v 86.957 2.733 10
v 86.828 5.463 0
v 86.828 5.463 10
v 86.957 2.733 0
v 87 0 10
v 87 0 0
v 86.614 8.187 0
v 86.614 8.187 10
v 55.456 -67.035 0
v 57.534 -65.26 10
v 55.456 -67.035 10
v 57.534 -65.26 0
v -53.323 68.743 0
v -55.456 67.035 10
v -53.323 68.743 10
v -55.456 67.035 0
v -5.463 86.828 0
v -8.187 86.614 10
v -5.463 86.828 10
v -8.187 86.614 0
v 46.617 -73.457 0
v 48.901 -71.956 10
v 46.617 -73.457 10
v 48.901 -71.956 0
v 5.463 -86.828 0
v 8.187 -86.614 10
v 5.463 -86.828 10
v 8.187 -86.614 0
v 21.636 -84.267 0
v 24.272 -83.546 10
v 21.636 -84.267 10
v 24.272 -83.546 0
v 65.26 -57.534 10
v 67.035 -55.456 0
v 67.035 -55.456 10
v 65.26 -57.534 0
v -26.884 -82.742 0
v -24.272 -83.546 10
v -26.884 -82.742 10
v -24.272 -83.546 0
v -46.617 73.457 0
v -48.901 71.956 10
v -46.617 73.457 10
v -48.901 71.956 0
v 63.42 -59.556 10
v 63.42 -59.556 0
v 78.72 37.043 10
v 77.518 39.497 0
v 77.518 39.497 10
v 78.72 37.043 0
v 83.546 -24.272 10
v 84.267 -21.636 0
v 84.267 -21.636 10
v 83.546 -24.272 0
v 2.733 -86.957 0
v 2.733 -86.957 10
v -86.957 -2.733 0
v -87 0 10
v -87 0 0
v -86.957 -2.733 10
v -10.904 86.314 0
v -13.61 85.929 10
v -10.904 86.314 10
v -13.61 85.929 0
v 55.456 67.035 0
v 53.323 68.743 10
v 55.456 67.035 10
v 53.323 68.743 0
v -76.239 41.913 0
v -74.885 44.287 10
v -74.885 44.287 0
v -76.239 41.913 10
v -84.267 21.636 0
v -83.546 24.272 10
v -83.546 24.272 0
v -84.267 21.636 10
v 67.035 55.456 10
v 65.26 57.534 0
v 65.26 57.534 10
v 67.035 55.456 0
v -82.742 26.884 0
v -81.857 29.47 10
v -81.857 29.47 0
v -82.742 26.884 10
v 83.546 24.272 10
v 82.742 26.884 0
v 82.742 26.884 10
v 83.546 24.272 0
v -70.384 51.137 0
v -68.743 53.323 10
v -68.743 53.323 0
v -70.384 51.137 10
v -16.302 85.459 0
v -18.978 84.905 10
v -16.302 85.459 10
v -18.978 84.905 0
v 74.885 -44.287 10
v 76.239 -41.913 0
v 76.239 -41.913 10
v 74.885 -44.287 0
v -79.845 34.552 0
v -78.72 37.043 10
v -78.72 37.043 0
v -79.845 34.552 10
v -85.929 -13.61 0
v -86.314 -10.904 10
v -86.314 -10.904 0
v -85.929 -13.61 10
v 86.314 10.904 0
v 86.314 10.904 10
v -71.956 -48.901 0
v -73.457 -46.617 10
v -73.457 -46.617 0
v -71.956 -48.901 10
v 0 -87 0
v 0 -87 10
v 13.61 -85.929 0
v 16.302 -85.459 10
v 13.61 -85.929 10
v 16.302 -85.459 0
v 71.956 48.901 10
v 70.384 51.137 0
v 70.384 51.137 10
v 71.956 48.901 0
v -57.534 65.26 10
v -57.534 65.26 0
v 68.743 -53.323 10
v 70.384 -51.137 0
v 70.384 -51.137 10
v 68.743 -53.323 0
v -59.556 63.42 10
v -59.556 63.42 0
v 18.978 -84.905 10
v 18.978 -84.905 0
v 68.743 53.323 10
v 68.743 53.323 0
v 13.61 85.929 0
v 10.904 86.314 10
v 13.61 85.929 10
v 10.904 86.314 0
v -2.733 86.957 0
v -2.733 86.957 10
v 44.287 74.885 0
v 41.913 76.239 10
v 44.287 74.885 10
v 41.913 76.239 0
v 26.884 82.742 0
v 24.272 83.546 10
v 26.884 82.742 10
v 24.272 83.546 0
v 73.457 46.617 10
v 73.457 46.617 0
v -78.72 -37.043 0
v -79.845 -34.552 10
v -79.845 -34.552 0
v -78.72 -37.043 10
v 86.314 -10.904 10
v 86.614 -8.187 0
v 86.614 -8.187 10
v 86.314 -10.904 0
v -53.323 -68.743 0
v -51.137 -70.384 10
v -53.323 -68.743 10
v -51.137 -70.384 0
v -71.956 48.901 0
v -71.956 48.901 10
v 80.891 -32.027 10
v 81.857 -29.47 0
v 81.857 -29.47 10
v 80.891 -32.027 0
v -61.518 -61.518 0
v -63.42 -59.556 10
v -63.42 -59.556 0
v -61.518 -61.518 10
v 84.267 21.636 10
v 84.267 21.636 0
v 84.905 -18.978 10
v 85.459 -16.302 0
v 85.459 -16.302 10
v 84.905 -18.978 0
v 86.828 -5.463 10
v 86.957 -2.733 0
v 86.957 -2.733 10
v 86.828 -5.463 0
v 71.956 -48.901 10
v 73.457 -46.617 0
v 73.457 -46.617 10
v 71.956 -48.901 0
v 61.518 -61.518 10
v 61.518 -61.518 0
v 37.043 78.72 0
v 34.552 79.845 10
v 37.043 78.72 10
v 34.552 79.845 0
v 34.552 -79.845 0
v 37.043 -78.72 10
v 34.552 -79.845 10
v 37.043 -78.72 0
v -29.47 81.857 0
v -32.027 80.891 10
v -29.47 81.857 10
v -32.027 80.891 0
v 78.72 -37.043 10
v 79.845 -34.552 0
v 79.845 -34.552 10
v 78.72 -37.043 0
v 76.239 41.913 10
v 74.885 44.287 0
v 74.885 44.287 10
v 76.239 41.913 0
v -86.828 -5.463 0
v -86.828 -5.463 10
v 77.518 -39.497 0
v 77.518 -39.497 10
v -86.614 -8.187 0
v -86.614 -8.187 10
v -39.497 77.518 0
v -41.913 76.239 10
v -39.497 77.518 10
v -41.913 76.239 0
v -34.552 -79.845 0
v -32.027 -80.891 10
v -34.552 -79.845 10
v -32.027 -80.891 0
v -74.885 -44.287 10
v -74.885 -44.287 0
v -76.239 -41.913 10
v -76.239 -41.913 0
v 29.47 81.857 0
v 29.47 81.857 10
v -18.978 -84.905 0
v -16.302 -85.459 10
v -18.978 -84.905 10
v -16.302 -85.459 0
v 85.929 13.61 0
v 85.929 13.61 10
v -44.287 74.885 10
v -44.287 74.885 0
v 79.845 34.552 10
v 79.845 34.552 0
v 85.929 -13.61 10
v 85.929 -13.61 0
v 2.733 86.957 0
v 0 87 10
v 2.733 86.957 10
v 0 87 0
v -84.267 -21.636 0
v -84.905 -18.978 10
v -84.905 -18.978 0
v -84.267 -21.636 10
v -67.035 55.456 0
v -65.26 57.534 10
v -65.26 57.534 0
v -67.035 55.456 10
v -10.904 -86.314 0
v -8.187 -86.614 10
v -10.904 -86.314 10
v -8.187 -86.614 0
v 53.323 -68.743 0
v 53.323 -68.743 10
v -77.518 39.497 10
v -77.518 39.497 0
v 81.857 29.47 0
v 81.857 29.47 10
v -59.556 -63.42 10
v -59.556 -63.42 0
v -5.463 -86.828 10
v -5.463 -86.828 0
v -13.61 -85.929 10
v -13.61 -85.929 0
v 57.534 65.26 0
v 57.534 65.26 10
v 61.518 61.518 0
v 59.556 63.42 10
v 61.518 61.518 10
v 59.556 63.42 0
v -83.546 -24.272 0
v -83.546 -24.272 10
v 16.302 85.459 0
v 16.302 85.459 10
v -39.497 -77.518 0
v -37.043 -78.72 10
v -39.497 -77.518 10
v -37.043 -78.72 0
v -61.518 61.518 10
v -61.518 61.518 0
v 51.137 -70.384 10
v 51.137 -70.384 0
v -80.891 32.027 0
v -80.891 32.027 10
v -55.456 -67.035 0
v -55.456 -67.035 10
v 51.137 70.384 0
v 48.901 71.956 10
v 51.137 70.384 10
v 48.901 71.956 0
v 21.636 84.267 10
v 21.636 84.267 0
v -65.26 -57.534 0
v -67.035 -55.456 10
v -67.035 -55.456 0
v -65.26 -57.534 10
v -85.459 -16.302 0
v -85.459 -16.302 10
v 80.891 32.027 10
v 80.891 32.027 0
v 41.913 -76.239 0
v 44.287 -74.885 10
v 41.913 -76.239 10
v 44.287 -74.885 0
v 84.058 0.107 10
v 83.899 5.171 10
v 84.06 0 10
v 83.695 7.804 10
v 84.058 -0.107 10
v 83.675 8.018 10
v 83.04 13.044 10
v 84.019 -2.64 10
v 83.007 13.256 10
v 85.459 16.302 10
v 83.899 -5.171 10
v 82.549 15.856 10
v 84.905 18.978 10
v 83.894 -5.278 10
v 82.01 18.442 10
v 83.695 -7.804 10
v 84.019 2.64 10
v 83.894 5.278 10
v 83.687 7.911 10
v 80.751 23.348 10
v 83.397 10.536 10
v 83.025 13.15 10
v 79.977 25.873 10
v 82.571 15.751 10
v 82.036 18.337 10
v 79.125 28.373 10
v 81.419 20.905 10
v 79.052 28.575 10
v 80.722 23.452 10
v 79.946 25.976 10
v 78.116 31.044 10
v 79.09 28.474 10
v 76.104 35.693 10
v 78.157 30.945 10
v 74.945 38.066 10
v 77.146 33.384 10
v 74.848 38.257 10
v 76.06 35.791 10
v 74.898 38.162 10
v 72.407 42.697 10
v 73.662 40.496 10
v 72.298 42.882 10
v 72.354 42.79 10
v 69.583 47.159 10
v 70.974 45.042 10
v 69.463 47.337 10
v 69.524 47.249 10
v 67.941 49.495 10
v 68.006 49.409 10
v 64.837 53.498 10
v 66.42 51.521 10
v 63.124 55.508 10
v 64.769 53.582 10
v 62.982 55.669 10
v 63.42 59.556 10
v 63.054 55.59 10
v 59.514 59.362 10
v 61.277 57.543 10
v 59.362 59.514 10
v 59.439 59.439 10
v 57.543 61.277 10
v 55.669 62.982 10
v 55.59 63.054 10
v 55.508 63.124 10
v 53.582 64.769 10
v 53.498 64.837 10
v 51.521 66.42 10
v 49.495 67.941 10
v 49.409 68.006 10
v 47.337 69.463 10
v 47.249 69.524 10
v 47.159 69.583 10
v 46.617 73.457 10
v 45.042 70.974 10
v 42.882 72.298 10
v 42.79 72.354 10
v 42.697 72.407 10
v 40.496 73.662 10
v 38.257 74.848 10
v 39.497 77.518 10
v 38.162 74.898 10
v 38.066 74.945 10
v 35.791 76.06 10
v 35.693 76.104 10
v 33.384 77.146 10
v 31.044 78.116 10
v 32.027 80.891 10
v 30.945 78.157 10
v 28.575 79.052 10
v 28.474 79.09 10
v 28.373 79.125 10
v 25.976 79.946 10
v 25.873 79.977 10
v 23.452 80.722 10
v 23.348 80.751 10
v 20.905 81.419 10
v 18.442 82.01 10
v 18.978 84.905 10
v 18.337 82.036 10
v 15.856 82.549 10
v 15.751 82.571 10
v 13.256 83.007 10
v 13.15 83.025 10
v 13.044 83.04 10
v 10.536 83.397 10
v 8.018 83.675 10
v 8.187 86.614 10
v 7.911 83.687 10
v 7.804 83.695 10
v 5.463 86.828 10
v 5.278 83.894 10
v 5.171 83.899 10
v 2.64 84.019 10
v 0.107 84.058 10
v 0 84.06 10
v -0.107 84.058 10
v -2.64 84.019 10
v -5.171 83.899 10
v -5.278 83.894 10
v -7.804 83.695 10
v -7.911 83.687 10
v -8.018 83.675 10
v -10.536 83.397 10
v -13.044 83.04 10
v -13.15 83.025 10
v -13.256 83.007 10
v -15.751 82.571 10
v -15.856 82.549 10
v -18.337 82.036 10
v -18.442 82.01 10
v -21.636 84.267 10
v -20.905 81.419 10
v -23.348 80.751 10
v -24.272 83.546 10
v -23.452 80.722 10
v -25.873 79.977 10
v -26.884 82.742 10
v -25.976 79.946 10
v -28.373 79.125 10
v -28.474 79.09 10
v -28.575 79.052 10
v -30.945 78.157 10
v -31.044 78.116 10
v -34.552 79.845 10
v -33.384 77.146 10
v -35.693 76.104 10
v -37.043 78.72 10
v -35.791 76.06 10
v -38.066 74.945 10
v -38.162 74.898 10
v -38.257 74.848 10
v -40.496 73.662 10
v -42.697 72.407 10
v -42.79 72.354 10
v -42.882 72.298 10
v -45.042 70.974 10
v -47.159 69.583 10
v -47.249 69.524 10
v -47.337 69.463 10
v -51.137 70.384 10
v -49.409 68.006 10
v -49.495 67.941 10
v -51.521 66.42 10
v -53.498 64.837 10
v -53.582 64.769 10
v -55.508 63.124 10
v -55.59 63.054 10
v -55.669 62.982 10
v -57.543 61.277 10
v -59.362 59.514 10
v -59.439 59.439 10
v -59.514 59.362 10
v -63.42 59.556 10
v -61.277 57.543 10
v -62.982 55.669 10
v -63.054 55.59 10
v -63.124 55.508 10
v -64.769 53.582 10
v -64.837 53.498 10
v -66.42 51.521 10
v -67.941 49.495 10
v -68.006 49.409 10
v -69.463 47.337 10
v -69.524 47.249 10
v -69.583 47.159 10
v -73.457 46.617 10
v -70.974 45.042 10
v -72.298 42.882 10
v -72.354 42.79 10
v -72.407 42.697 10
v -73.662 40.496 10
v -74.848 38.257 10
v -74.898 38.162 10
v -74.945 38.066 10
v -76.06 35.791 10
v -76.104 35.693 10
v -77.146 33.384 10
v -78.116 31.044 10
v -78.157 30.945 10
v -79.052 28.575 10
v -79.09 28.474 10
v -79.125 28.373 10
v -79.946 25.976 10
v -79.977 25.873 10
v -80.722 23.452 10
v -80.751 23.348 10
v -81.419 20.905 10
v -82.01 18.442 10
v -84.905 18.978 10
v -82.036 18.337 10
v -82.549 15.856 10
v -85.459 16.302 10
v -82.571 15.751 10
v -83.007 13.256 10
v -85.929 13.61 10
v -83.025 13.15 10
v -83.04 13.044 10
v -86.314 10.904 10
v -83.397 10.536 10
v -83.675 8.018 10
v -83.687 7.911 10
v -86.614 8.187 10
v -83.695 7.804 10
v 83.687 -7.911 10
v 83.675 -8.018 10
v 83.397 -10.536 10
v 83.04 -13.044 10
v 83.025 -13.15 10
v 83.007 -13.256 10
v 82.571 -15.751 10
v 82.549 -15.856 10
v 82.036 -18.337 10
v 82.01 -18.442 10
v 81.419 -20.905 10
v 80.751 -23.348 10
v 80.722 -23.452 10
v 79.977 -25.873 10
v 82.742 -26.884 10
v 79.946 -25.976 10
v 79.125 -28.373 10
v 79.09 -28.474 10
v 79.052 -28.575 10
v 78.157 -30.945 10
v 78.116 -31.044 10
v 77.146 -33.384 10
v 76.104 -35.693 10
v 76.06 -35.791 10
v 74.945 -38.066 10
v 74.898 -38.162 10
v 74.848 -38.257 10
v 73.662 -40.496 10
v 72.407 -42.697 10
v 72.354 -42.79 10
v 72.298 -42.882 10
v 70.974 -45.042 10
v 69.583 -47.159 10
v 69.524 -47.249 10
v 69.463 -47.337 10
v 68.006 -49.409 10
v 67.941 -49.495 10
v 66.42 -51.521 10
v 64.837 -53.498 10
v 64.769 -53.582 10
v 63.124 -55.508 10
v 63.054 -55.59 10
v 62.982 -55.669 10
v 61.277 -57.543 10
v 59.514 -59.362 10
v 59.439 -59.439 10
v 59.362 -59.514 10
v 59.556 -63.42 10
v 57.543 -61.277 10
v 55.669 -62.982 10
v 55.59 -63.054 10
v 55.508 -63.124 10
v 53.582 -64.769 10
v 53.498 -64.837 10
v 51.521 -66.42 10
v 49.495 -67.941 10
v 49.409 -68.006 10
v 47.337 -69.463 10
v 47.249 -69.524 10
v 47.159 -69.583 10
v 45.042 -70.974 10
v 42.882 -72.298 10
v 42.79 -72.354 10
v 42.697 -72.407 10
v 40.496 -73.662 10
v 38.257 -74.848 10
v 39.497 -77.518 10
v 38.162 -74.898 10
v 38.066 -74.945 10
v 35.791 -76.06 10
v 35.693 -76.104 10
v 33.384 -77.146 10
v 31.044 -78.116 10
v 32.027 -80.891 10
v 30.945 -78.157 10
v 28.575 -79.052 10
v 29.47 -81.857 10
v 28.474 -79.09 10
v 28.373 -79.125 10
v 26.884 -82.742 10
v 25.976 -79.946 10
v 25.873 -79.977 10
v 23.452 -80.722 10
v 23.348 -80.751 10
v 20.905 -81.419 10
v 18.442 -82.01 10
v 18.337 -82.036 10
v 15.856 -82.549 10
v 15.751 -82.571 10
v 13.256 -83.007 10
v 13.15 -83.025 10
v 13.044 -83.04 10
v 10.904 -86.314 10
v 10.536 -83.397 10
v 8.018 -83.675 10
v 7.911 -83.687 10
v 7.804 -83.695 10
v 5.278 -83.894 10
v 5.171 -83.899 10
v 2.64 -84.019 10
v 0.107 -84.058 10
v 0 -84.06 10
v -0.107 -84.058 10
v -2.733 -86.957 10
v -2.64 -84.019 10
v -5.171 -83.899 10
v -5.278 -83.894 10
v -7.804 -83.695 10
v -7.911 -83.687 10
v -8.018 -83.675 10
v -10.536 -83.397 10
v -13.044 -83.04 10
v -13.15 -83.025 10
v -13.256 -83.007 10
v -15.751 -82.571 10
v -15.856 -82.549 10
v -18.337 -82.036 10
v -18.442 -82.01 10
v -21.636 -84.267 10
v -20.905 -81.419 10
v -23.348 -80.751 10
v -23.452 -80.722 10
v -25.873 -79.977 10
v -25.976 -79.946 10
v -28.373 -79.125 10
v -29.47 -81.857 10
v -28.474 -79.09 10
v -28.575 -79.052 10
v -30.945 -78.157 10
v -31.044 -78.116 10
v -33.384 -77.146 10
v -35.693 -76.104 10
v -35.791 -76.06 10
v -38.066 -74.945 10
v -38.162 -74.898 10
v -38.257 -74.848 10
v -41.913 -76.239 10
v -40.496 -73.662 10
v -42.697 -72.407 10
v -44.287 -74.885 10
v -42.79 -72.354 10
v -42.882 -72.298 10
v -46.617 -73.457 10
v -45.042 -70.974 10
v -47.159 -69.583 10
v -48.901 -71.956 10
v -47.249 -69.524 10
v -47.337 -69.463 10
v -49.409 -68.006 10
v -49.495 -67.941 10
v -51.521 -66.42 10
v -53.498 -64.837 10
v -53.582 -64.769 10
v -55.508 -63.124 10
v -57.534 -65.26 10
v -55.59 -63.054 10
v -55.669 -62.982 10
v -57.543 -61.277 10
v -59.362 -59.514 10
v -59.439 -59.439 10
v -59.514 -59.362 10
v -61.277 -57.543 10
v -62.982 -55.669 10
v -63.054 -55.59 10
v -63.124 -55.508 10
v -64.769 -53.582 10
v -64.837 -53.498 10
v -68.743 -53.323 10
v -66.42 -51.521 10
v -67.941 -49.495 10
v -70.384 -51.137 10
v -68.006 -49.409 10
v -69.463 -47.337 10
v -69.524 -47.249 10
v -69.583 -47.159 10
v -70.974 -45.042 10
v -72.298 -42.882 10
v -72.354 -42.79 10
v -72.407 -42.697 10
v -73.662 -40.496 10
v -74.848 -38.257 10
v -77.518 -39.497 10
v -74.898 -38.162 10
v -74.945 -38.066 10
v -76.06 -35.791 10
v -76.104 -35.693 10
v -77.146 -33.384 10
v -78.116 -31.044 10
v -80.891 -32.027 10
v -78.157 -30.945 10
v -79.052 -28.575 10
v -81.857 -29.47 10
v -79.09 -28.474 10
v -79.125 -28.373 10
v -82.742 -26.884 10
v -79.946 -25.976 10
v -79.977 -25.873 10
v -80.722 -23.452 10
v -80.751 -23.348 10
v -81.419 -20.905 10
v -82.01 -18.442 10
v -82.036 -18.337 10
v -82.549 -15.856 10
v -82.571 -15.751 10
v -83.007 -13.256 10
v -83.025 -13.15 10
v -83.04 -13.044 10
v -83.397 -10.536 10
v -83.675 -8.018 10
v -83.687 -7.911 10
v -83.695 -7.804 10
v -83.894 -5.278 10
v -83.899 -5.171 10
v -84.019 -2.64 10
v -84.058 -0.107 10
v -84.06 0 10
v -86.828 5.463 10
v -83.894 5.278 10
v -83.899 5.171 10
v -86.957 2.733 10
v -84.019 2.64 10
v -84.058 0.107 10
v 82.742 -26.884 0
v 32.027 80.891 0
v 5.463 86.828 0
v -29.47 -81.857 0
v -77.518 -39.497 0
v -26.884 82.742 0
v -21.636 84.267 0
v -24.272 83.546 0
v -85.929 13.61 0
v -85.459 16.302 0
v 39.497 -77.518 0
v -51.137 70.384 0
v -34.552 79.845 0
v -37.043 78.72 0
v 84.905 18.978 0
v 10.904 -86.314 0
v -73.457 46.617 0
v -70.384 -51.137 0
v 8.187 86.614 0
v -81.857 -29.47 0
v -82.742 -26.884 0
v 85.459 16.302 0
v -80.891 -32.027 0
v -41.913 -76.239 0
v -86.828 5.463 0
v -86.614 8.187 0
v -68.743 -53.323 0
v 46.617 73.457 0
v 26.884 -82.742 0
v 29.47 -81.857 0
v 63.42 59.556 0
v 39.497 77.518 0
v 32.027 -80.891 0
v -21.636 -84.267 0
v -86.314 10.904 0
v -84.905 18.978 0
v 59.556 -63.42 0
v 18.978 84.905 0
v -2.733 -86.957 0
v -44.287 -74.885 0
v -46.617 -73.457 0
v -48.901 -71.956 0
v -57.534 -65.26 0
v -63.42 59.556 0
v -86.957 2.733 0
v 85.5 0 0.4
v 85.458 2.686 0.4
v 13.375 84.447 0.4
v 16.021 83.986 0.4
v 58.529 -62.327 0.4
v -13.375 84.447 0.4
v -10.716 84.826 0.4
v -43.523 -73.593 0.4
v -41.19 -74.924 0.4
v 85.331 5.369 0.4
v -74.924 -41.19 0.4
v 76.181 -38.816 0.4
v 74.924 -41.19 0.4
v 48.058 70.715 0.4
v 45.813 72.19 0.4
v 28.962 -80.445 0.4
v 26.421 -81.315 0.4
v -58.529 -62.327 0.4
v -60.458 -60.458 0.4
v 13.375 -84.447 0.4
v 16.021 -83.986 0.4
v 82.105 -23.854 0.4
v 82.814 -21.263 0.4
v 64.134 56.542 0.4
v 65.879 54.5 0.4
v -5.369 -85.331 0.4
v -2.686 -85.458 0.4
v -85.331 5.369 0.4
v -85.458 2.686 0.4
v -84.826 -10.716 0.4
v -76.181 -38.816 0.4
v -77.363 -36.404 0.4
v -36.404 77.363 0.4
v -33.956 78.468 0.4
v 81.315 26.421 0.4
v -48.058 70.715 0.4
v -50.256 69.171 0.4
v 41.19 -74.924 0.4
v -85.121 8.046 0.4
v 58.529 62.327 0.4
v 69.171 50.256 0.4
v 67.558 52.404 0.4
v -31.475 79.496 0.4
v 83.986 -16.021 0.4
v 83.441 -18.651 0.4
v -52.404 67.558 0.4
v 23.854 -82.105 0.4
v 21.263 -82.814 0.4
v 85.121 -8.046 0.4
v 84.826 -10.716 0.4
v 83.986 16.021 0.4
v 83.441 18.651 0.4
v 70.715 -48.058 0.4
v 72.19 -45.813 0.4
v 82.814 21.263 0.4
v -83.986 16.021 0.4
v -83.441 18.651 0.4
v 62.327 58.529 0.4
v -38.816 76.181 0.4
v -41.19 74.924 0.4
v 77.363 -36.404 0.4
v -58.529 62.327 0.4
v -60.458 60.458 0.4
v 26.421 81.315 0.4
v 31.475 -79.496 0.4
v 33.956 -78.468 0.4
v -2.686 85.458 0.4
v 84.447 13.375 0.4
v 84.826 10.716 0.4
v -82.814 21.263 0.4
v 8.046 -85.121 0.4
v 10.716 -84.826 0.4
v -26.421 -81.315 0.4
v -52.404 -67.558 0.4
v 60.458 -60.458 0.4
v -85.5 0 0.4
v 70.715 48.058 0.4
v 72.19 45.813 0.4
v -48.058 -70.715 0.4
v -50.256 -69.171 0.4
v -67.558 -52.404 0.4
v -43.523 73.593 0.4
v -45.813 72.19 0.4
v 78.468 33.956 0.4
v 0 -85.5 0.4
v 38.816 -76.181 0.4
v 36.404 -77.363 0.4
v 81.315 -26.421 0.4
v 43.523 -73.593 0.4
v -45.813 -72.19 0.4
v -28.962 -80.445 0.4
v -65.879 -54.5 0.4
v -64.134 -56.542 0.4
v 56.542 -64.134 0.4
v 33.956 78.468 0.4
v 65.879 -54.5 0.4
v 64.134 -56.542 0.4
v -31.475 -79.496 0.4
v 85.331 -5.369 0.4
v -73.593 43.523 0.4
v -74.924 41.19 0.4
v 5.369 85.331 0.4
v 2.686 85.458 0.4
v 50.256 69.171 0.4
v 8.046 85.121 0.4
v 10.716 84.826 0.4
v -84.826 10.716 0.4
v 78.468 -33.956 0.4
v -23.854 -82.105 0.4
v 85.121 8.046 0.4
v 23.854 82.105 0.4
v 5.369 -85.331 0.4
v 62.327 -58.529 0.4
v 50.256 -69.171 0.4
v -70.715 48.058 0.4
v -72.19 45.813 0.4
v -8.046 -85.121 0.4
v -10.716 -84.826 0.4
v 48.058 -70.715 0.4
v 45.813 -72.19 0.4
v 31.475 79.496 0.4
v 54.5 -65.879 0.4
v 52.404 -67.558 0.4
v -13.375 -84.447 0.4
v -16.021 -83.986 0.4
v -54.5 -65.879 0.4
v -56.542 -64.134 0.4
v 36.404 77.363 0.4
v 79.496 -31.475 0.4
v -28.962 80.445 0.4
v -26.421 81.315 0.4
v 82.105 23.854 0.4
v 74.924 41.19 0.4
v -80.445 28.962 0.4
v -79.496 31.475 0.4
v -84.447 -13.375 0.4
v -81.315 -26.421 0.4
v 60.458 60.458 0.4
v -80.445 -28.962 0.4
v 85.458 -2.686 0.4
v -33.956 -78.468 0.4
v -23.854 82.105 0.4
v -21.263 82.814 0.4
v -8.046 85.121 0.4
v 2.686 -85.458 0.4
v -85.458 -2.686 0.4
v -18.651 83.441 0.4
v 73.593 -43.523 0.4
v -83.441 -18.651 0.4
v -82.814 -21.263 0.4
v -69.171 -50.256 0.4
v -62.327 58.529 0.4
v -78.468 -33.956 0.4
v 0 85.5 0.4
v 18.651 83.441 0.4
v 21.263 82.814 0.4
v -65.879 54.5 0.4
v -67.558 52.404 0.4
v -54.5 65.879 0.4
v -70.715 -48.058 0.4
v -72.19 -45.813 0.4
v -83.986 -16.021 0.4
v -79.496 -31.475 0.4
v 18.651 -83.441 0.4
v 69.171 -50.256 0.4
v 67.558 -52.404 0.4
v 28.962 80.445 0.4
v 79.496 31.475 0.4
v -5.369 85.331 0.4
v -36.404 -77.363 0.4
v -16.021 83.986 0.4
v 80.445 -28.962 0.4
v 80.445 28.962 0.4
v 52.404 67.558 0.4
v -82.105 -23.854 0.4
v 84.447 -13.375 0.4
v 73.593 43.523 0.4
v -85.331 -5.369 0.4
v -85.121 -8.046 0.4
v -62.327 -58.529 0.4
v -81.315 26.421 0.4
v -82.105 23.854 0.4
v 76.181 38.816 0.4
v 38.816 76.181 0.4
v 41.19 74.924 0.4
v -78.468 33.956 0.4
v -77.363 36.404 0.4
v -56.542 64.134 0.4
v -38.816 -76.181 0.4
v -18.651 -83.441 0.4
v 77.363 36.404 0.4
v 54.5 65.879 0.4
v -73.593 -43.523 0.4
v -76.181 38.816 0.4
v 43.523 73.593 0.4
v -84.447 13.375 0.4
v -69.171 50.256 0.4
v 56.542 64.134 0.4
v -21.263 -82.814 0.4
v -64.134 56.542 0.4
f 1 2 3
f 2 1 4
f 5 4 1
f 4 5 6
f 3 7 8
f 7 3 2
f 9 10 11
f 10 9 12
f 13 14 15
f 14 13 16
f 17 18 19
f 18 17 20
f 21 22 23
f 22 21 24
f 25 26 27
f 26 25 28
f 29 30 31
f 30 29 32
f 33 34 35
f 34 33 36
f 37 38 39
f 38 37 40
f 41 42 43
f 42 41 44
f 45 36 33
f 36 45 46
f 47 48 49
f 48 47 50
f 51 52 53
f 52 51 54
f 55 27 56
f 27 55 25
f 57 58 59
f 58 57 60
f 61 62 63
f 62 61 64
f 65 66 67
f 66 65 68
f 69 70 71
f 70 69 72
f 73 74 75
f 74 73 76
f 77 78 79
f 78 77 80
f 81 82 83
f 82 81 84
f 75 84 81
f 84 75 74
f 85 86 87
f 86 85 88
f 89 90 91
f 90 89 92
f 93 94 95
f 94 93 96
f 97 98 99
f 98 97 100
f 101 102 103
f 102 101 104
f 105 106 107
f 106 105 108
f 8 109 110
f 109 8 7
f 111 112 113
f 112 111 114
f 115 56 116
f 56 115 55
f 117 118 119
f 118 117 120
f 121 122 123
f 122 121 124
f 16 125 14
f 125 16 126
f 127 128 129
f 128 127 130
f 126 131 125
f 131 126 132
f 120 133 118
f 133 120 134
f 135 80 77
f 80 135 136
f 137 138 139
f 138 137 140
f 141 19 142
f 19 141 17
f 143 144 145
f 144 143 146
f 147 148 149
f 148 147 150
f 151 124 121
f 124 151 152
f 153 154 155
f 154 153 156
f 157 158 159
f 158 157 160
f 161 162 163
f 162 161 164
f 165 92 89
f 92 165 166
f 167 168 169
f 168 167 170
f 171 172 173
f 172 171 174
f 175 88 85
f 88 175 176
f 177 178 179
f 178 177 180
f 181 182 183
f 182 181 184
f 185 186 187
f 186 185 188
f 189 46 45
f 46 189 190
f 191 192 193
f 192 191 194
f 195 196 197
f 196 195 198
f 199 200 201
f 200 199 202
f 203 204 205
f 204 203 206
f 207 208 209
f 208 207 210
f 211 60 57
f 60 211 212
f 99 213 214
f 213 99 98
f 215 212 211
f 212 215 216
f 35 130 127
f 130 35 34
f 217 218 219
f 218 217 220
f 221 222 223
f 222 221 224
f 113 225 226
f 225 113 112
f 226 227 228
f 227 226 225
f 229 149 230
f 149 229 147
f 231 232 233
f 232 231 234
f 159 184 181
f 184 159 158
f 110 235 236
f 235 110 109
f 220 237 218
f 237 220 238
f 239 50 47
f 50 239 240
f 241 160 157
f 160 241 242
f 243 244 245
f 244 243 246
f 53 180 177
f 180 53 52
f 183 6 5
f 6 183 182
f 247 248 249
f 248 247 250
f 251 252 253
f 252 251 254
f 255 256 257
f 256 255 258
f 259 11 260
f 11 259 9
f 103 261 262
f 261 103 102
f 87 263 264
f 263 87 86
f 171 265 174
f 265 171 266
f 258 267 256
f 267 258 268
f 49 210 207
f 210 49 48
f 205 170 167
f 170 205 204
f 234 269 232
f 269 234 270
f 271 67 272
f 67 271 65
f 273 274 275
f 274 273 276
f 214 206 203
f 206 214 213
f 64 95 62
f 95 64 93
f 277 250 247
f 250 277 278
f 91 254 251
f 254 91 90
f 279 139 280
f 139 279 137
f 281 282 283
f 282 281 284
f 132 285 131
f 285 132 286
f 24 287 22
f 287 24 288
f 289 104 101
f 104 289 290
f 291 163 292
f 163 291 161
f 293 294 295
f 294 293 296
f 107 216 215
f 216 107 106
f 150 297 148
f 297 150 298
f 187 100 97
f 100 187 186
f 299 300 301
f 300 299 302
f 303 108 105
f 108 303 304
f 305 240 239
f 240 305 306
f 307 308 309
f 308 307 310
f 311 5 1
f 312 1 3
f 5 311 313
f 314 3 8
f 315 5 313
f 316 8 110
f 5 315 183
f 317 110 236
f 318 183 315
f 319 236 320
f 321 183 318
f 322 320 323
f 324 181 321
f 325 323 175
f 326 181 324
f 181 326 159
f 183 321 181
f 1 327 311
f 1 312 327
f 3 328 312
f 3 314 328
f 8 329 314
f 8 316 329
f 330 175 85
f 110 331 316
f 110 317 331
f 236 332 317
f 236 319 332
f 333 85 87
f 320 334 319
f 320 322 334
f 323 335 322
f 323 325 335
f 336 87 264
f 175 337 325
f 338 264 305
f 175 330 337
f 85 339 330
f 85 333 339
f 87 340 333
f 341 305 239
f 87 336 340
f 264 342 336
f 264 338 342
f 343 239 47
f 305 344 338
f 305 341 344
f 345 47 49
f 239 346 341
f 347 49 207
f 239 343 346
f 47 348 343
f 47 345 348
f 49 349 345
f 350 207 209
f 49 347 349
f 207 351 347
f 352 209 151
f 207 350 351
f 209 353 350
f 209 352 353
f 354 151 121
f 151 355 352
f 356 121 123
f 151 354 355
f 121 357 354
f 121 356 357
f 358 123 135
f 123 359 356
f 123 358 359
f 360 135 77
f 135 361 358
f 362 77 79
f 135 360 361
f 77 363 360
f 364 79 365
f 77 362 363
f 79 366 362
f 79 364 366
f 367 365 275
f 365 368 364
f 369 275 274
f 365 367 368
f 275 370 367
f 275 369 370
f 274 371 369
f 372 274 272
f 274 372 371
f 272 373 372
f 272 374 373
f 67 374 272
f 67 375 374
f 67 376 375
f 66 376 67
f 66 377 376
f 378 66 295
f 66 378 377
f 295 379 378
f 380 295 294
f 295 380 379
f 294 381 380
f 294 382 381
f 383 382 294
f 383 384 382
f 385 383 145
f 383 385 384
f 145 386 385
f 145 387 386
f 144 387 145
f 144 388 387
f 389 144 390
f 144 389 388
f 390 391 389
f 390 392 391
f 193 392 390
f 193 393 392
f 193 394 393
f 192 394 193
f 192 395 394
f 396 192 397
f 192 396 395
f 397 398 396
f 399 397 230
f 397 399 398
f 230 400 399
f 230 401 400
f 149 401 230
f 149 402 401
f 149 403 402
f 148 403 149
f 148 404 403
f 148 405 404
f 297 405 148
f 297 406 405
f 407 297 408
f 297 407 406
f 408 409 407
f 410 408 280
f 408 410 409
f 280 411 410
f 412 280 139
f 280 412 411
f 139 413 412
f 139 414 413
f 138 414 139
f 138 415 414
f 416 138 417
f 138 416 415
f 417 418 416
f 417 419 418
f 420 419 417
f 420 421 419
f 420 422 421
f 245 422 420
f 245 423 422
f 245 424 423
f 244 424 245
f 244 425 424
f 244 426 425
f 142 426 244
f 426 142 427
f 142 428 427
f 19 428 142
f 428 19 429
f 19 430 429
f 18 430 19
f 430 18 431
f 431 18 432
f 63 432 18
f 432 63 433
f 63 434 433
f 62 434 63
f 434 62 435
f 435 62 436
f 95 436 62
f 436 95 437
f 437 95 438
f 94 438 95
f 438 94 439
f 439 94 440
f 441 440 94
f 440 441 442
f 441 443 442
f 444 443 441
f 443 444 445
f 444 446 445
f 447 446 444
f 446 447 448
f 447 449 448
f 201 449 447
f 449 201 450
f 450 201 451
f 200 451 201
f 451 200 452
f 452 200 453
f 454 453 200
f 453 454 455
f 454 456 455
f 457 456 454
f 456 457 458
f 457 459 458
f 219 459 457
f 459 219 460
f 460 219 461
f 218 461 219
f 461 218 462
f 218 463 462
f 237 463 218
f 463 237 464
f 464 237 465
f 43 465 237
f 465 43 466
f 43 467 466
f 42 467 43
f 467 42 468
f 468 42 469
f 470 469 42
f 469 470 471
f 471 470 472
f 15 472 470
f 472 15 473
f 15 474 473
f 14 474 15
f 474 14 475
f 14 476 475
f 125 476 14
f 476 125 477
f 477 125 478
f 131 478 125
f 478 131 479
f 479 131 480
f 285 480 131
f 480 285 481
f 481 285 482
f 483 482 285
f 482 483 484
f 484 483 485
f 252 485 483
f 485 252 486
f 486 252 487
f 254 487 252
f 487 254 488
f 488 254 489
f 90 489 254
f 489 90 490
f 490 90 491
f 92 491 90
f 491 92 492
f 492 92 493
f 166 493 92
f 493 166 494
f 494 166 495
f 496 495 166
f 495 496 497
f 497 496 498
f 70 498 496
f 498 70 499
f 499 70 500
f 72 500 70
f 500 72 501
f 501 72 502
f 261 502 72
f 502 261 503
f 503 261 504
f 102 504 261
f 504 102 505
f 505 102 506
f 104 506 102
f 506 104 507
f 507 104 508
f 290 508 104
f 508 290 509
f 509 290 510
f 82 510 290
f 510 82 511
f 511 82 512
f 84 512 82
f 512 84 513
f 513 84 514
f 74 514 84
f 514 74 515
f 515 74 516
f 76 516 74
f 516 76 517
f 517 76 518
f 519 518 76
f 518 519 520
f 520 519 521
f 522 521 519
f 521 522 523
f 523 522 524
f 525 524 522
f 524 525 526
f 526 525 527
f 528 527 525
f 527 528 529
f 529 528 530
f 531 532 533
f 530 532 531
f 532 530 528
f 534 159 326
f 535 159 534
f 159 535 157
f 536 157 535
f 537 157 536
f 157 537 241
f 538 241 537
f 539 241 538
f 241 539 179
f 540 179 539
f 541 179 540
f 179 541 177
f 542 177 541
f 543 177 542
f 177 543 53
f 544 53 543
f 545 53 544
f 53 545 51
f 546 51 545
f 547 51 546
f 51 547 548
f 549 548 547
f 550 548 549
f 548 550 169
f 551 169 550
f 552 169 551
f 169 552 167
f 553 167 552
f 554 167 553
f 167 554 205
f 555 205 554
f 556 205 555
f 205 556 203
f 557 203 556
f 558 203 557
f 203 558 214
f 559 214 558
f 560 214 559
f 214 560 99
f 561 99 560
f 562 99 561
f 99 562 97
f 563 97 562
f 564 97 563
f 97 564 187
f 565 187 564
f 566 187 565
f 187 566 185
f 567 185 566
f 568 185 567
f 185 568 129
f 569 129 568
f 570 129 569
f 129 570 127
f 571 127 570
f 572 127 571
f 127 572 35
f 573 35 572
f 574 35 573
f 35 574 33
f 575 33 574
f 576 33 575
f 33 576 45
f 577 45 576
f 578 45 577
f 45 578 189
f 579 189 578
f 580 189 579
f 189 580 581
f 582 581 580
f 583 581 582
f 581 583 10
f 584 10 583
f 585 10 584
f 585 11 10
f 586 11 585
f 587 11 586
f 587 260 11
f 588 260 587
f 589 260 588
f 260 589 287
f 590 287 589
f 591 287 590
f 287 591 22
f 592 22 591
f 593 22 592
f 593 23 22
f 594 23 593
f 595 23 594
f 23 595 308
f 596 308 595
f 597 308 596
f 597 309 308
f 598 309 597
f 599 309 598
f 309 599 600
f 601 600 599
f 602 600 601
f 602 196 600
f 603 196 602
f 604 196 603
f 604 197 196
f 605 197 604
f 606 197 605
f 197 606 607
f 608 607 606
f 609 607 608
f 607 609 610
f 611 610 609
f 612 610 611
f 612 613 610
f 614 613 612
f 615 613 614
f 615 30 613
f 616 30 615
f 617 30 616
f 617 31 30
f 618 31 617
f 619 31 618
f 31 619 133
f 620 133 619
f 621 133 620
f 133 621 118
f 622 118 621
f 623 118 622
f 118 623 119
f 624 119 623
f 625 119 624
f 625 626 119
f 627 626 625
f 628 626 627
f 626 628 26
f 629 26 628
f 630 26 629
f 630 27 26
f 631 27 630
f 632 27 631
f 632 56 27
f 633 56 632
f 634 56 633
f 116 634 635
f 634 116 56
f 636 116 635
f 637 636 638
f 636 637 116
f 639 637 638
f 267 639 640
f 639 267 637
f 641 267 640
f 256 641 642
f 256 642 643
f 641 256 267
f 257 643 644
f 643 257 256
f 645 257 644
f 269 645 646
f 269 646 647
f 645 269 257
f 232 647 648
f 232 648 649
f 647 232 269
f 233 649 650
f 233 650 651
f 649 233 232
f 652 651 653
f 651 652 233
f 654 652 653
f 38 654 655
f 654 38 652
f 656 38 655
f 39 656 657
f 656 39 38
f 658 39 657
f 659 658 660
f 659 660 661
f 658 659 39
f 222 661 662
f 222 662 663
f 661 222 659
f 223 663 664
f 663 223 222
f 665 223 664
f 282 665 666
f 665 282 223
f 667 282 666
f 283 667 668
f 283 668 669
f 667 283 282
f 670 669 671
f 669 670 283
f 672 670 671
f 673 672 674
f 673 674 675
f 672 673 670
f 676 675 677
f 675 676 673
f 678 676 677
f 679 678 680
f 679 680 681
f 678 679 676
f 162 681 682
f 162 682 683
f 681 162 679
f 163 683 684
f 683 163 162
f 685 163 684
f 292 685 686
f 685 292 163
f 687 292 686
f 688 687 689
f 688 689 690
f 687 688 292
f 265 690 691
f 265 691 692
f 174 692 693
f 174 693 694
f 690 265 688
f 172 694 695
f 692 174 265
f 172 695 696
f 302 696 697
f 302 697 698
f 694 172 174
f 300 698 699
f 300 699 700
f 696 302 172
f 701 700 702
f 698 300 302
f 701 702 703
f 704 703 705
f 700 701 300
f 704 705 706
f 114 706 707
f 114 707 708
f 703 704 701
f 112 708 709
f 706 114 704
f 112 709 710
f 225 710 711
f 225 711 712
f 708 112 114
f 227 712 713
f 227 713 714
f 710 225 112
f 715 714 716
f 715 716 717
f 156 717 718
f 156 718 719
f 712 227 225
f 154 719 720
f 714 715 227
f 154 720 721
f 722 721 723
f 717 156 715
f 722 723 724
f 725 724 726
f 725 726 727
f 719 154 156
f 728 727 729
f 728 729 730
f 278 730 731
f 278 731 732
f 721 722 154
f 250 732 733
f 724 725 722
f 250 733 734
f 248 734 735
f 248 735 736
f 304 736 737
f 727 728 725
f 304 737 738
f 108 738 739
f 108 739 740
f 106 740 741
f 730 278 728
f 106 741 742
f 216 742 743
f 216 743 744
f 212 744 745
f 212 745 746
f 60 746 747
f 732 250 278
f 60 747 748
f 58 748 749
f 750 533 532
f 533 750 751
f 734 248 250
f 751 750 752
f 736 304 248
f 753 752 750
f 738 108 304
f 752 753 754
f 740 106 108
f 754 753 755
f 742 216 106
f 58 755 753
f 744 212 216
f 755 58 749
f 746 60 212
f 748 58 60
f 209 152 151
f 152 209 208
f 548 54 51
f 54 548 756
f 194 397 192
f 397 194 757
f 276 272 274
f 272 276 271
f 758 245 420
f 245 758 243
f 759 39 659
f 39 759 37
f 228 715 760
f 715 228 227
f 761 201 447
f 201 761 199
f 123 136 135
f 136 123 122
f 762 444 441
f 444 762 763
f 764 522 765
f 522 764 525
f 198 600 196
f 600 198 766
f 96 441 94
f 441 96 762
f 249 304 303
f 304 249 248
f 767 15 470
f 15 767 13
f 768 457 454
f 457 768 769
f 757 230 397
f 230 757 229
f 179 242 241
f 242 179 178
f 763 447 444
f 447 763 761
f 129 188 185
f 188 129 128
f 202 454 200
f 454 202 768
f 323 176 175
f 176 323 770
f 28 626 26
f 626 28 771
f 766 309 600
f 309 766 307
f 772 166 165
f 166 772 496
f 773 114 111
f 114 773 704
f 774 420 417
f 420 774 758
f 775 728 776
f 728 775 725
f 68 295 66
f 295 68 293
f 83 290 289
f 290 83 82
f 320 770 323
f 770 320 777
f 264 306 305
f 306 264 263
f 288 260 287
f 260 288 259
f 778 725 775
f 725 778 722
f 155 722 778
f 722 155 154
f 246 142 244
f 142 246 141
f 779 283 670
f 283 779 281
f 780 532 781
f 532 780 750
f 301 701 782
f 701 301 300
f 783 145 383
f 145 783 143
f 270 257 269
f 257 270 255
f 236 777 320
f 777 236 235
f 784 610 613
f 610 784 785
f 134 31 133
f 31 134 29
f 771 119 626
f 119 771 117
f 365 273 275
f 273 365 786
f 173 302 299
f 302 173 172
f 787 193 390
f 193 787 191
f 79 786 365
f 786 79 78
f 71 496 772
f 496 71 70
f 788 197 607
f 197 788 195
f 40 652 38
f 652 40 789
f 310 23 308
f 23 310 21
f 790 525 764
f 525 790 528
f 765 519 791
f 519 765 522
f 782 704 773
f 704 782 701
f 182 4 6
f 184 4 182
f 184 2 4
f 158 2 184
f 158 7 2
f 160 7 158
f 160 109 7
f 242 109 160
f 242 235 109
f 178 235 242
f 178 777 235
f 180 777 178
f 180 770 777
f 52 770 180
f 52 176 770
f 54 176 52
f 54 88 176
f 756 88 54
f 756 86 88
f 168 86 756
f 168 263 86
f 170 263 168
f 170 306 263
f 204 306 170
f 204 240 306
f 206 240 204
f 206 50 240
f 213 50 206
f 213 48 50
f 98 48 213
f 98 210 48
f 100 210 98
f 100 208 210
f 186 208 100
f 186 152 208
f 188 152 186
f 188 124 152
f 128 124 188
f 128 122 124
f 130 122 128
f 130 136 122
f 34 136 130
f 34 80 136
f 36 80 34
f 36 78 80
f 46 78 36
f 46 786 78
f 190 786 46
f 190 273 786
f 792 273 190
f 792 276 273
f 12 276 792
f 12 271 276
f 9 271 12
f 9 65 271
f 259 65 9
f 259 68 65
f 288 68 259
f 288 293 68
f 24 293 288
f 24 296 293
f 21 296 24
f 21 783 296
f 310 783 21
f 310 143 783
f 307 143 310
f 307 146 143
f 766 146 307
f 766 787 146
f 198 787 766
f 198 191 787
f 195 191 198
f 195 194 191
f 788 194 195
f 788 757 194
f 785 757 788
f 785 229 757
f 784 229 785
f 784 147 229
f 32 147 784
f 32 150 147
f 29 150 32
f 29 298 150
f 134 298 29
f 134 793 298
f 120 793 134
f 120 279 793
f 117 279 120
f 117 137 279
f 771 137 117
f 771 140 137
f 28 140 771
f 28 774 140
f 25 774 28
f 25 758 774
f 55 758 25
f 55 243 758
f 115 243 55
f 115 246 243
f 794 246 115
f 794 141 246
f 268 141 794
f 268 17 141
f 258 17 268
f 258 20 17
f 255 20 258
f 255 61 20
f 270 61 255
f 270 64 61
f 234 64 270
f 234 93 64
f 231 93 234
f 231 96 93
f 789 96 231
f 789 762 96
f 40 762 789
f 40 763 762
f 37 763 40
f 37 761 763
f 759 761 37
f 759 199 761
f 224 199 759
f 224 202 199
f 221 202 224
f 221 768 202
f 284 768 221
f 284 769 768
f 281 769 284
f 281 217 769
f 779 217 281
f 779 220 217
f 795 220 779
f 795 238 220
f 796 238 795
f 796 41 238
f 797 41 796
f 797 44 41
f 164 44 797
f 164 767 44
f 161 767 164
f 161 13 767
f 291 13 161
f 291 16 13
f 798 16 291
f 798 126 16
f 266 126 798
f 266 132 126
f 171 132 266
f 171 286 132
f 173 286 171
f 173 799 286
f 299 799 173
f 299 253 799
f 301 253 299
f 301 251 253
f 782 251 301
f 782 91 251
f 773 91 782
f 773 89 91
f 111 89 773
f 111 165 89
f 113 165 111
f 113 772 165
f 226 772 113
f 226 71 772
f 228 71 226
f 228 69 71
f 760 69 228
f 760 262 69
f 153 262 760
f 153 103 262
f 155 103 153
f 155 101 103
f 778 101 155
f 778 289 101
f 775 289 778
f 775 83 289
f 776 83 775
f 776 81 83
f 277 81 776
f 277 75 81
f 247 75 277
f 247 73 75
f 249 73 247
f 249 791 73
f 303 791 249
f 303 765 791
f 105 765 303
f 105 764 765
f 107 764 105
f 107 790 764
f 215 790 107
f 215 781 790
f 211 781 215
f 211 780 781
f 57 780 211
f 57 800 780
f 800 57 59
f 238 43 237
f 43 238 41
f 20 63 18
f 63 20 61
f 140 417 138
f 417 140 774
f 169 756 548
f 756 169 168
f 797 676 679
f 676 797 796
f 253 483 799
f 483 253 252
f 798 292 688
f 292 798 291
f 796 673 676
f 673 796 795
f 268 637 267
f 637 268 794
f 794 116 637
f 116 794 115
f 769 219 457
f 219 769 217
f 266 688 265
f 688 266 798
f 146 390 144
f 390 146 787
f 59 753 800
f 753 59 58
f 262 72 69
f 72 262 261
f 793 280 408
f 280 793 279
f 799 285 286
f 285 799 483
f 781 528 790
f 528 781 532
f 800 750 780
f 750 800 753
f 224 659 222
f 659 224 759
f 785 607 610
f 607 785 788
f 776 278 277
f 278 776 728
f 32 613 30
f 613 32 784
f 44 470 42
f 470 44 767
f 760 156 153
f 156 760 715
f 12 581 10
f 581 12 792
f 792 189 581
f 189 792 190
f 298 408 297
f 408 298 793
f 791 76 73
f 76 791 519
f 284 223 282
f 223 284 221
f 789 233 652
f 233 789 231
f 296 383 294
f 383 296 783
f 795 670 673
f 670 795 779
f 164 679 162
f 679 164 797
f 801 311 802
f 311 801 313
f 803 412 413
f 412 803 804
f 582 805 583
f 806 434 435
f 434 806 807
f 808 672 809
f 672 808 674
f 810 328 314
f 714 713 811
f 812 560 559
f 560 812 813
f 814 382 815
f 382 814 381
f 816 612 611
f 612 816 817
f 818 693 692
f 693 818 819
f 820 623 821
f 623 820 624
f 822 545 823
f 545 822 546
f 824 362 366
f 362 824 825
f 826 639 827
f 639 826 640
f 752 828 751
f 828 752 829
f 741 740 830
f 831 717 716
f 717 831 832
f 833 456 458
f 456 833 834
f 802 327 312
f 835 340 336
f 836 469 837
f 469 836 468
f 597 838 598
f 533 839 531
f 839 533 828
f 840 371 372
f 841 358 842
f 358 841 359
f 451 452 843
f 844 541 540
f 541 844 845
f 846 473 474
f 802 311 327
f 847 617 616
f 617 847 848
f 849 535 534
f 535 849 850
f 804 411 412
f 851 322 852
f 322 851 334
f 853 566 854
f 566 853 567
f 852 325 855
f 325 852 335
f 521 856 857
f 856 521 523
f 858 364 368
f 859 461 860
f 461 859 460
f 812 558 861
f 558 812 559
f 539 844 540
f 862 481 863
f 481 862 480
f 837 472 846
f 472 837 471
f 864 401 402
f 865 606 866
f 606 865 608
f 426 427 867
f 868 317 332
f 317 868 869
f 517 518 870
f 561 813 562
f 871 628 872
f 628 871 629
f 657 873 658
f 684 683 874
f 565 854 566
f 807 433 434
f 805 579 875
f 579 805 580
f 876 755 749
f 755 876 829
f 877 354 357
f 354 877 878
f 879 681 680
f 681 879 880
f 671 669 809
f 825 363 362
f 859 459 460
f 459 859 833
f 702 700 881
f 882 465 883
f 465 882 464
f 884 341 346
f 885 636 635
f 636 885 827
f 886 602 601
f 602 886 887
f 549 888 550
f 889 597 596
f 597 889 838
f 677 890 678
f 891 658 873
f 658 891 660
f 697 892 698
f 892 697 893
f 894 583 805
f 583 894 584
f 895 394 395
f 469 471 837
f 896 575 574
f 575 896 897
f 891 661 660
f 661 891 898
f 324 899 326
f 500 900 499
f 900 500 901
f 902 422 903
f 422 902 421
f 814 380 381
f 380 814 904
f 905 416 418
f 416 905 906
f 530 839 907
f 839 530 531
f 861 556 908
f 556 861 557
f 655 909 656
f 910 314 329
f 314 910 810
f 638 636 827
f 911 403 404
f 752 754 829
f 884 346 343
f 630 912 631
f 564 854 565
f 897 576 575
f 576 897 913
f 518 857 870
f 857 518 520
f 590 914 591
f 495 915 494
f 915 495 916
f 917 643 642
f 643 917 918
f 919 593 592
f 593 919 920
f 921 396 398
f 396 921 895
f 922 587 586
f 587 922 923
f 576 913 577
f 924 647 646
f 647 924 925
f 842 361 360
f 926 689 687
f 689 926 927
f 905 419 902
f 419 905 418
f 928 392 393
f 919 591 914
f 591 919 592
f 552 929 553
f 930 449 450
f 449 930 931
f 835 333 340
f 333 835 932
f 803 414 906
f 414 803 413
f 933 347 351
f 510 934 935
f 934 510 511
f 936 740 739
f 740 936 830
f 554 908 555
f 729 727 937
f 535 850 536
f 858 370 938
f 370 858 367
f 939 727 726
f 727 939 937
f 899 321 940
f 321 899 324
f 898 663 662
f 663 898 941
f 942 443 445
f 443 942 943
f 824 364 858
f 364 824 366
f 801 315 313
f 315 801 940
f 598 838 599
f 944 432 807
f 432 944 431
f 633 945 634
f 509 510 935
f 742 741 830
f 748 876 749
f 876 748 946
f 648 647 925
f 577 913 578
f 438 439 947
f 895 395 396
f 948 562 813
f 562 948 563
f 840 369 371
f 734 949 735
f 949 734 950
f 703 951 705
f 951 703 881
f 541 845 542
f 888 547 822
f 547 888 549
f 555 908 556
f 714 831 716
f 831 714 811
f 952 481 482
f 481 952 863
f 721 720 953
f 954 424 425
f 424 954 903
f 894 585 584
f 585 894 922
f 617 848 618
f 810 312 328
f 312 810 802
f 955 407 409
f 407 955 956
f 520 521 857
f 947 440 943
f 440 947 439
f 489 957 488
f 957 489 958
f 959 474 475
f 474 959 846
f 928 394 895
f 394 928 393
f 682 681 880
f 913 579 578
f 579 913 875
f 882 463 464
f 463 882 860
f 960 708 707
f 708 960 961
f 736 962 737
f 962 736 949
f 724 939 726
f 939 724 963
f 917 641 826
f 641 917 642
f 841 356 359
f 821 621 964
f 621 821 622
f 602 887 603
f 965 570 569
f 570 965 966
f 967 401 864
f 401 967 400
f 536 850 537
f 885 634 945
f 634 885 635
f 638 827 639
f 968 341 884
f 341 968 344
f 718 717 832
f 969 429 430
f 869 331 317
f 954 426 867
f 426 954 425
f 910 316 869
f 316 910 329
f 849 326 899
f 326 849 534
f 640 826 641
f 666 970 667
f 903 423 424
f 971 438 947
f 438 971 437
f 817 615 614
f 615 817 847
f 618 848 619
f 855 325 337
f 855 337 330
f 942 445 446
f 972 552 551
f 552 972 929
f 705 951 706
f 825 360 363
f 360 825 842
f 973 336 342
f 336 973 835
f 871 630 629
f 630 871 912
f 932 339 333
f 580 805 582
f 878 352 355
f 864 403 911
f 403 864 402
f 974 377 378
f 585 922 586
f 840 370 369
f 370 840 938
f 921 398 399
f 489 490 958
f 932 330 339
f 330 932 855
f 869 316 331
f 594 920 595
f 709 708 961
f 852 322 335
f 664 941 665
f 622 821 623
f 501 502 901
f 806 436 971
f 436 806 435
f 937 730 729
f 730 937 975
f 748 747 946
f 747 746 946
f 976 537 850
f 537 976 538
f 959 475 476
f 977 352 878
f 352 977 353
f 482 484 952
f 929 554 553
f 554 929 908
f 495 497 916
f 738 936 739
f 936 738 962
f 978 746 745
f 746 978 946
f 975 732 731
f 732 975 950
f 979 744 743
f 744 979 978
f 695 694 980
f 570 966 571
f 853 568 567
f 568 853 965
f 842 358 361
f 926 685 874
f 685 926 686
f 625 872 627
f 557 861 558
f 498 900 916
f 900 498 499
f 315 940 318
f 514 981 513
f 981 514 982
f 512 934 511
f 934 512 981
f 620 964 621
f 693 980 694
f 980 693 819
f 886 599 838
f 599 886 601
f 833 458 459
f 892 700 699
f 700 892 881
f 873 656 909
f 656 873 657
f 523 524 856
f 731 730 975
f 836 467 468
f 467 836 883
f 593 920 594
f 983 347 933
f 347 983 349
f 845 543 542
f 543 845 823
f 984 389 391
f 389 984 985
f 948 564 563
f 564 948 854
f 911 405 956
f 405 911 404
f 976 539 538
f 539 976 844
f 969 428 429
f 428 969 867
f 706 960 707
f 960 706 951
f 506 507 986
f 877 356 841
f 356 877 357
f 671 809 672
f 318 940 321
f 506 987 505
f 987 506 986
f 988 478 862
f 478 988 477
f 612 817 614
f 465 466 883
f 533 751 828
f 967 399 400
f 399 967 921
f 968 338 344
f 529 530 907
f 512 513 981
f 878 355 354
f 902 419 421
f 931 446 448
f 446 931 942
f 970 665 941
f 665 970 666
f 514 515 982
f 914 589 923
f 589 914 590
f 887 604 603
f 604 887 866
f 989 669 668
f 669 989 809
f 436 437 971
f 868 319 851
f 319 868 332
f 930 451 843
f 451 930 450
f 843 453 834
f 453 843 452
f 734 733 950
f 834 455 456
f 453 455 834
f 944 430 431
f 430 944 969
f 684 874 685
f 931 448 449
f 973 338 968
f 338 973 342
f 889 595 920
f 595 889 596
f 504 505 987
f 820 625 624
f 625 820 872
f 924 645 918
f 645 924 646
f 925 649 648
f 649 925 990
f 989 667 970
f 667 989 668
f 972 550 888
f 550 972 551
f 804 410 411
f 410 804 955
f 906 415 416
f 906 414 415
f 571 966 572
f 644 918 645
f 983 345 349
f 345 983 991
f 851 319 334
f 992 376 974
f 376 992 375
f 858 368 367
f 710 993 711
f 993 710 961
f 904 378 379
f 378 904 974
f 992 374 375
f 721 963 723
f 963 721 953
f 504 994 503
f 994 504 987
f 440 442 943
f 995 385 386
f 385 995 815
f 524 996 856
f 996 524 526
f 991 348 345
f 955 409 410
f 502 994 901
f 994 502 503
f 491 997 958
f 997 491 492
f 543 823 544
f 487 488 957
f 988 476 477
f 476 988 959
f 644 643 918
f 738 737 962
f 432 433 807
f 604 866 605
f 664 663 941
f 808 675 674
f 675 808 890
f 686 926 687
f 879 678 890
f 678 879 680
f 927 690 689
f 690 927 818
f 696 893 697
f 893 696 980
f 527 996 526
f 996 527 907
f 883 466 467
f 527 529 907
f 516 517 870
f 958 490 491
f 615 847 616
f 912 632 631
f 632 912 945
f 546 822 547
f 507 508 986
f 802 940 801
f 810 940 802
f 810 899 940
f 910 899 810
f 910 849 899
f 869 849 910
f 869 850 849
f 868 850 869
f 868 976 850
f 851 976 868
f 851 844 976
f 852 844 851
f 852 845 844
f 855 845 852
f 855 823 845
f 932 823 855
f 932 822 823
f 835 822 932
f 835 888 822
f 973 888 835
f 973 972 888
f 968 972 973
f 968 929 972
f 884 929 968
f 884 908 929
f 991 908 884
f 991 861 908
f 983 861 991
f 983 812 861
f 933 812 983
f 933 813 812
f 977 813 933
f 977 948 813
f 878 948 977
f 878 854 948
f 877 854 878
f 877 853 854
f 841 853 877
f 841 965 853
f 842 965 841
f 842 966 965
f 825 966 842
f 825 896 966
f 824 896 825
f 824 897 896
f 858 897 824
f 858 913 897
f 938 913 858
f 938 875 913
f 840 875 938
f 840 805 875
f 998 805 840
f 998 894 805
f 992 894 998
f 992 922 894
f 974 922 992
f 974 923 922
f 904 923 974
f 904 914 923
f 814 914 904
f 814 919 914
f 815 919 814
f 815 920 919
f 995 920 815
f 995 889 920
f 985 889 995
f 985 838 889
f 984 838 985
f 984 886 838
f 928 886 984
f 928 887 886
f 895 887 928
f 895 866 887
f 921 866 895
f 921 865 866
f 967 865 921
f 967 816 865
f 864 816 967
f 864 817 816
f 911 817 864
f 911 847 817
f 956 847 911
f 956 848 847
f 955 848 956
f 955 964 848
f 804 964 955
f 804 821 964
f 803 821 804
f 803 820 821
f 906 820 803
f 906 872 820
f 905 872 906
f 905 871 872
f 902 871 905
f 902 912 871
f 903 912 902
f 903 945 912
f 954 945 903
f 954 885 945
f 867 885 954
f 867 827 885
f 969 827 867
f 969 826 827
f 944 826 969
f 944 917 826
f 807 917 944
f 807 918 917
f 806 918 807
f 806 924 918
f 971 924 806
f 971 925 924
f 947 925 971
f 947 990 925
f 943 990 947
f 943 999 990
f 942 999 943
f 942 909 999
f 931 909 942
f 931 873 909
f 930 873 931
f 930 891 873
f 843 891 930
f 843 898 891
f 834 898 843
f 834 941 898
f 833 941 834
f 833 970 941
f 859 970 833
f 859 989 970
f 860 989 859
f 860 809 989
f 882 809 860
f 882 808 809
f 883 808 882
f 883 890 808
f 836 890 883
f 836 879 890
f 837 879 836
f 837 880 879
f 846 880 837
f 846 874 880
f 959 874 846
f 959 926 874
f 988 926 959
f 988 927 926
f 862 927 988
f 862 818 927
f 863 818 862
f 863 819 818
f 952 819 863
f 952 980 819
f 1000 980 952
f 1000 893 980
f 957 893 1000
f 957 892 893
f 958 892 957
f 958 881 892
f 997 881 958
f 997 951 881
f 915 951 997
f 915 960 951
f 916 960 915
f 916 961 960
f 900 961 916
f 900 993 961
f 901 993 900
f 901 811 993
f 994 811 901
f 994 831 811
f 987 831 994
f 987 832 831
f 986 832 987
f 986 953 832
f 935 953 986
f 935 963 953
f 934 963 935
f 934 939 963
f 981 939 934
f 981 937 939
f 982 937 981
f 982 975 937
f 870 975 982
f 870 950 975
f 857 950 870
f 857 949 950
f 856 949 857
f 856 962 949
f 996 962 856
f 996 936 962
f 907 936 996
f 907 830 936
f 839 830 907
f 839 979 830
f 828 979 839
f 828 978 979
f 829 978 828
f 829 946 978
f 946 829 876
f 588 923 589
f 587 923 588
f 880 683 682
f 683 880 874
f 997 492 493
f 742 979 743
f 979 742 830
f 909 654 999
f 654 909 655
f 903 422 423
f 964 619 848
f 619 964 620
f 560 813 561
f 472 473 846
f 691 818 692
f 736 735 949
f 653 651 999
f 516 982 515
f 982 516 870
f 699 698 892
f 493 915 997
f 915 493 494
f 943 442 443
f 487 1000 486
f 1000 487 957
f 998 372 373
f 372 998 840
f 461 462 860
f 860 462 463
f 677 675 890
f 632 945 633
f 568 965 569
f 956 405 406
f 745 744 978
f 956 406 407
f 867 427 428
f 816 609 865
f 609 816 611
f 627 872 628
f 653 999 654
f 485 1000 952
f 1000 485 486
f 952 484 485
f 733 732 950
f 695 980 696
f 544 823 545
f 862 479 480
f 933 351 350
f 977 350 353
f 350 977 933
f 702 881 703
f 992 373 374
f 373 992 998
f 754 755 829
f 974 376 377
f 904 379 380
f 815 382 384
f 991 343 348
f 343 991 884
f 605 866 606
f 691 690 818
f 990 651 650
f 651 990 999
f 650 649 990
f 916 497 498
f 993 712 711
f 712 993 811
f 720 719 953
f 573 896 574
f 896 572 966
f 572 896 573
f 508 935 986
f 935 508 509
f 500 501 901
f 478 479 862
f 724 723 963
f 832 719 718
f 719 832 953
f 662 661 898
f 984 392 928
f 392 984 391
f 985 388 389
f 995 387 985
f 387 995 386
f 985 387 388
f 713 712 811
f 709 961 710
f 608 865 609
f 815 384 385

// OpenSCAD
// file: ../sc.scad
// ShortCuts.scad 
// Autor: Rudolf Huttary, Berlin 2015
//
$fn = 100; 

//show_examples(); 

module show_examples()
	place_in_rect(30, 30)
	{
		Cy(h = 10); 
		CyH(h = 10); 
		CyH(h = 10, w = 30); 
		CyS(h = 10); 
		CyS(h = 10, w1 = 25, w2 = 75); 
		Cu(10); 
		Ri(h = 10); 
		RiH(h = 10); 
		RiS(h = 10, w1 = 10); 
		RiS(h = 10, w1 = 30, w2 = 300); 
		Sp(); 
		SpH(10, 30, 30); 
	}


module help()
{
echo("==============="); 
echo("help(): shows this help"); 
echo("show_examples(): shows some examples"); 
echo("place_in_rect(): places children objects in grid"); 
echo("Transformations:"); 
echo(" transform :  T(x=0, y=0, z=0), Tx(x=0) , Ty(y=0), Tz(z=0)"); 
echo(" rotate :  R(x=0, y=0, z=0), Rx(x=0) , Ry(y=0), Rz(z=0)"); 
echo(" scale :  S(x=1, y=1, z=1), Sx(x=1) , Sy(y=1), Sz(z=1)"); 
echo("Logical"); 
echo(" difference :  D()"); 
echo(" union :  U()"); 
echo(" intersection : *missing*"); 
echo("Primitives"); 
echo(" circle :  Ci(r=10)"); 
echo(" circle_half :  CiH(r=10, w=0)")
echo(" circle_segment :  CiS(r=10, w1=0, w2=90)")
echo(" square :  Sq(x=10, y=0, center=true))"); 
echo(" cylinder :  Cy(r=10, h=1, center=true)"); 
echo(" cylinder_half :  CyH(r=10, w=0)")
echo(" cylinder_segment: CyS(r=10, h=1, w1=0, w2=90,center=true)"); 
echo(" cylinder_segment: Pie(r=10, h=1, w1=0, w2=90,center=true)"); 
echo(" cube :  Cu(x=10, y=0, z=10, center=true)"); 
echo(" ring :  Ri(R=10, r=5, h=1, center=true)"); 
echo(" ring_half :  RiH(R=10, r=5, h=1, w=0 center=true)"); 
echo(" ring_segment :  RiS(R=10, r=5, h=1, w1=0, w2=90, center=true)"); 
echo(" sphere:  Sp(r=10))"); 
echo(" sphere_half:  SpH(r=10, w1 = 0, w2 = 0))"); 
echo("==============="); 
}

// Euclidean Transformations
module T(x=0, y=0, z=0){translate([x, y, z])children(); }
module Tx(x) { translate([x, 0, 0])children(); }
module Ty(y) { translate([0, y, 0])children(); }
module Tz(z) { translate([0, 0, z])children(); }

module R(x=0, y=0, z=0){rotate([x, y, z]) children();}
module Rx(x=90){rotate([x, 0, 0]) children();}
module Ry(y=90){rotate([0, y, 0]) children();}
module Rz(z=90){rotate([0, 0, z]) children();}

module M(x=0, y=0, z=0){mirror([x, y, z]) children();}
module Mx(x=1){mirror([x, 0, 0]) children();}
module My(y=1){mirror([0, y, 0]) children();}
module Mz(z=1){mirror([0, 0, z]) children();}

module S(x=1, y=1, z=1){scale([x, y, z]) children();}
module Sx(x=1){scale([x, 1, 1]) children();}
module Sy(y=1){scale([1, y, 1]) children();}
module Sz(z=1){scale([1, 1, z]) children();}

module D() difference(){children(0); children([1:$children-1]);}
module U() children([0:$children-1]);
// module I() intersection()children([0:$children-1]); // does not work for some reason


// primitives - 2D

module Sq(x =10, y = 0, center = false)
{
   if(y==0)
		square([x, x], center = center); 
	else
		square([x, y], center = center); 
}
module Ci(r = 10)
{
	circle(r = r); 
}

// derived primitives - 2d
module CiH(r = 10, w = 0)
  circle_half(r, w); 

module CiS(r = 10, w1 = 0, w2 = 90)
  circle_segment(r, w1, w2); 


// primitives - 3d
module Cy(r = 10, h = 1, center = false)
{
	cylinder(r = r, h = h, center = center); 
}
module Cu(x = 10, y = 0, z = 10, center = false)
{
  if (y==0)
	cube([x, x, x], center = center); 
  else
	cube([x, y, z], center = center); 
}

// derived primitives - 3d
module CyH(r = 10, h = 1, w = 0, center = false)
  cylinder_half(r, h, w, center); 

module CyS(r = 10, h = 1, w1 = 0, w2 = 90, center = false)
  cylinder_segment(r, h, w1, w2, center); 

module Ri(R = 10, r = 5, h = 1, center = false)
  ring(R, r, h, center); 

module RiS(R = 10, r = 5, h = 1, w1 = 0, w2 = 90, center = false)
   ring_segment(R, r, h, w1, w2, center); 

module RiH(r1 = 10, r2, h = 1, w = 0, center = false)
   ring_half(r1, r2, h, w, center); 
module Pie(r = 10, h = 1, w1 = 0, w2 = 90, center = false)
  cylinder_segment(r, h, w1, w2, center);  
module Sp(r = 10)
  sphere(r); 
module SpH(r = 10, w1 = 0, w2 = 0)
  sphere_half(r, w1, w2); 
module SpS(r = 10, w1 = 0, w2 = 90, w3 = 90)
  sphere_segment(r, w1, w2); 




// clear text definitions
module circle_half(r = 10, w = 0)
{
	difference()
	{
		circle(r); 
     rotate([0, 0, w-90])
     translate([0, -r])
		square([r, 2*r], center = false); 
	}
}

module circle_segment(r = 10, w1 = 0, w2 = 90)
{
  W2 = (w1>w2)?w2+360:w2; 
  if (W2-w1 < 180)
    intersection()
		{
       circle_half(r, w1); 
       circle_half(r, W2-180); 
 		}
	else
    union()
		{
       circle_half(r, w1); 
       circle_half(r, W2-180); 
 		}
}

module cylinder_half(r = 10, h = 1, w = 0, center = true)
{
  linear_extrude(height = h, center = center)
  circle_half(r, w); 
} 

module cylinder_segment(r = 10, h = 1, w1 = 0, w2 = 90, center = true)
{
  linear_extrude(height = h, center = center)
  circle_segment(r, w1, w2); 
} 

module ring(R = 10, r = 5, h = 1, center = true)
{
	difference()
	{
	cylinder(r = R, h = h, center = center); 
   translate([0, 0, -2*h])
	cylinder(r = r, h = 4*h, center = false); 
	}
}

module ring_half(R = 10, r = 5, h = 1, w = 0, center = true)
{
	difference()
	{
		ring(R, r, h, center); 
     rotate([0, 0, w])
     translate([0, -R/2, 0])
		cube([2*R, R, 3*h], center = true); 
	}
}

module ring_segment(R = 10, r = 5, h = 1, w1 = 0, w2 = 90, center = true)
{
  W2 = (w1>w2)?w2+360:w2; 
  if (W2-w1 < 180)
    intersection()
		{
       ring_half(R, r, h, w1, center); 
       ring_half(R, r, h, W2-180, center); 
 		}
	else
    union()
		{
       ring_half(R, r, h, w1, center); 
       ring_half(R, r, h, W2-180, center); 
 		}
}


module sphere_half(r = 10, w1 = 0, w2 = 0)
{  
	difference()
	{
   	sphere(r); 
      rotate([-w1, -w2, 0])
     	translate([0, 0, r])
		cube([2*r, 2*r, r], center = true); 
	}

}


// additional code
module place_in_rect(dx =20, dy=20)
{
  cols = ceil(sqrt($children)); 
  rows = floor(sqrt($children)); 
  for(i = [0:$children-1])
	{ 
	  T(dx*(-cols/2+(i%cols)+.5), dy*(rows/2-floor(i/cols)-.5))
		 children(i); 
	}
}
// main file
use <../lib.scad>
$fn=200;

thick=0.4;
h=10;
//d=97; 
d=168;
//172; // diametro interno


difference(){
    cylinder(d=d+6,h=h);
    
    translate([0,0,thick])
    cylinder(r1=d/2+1.5,r2=d/2,h=h);
}    
